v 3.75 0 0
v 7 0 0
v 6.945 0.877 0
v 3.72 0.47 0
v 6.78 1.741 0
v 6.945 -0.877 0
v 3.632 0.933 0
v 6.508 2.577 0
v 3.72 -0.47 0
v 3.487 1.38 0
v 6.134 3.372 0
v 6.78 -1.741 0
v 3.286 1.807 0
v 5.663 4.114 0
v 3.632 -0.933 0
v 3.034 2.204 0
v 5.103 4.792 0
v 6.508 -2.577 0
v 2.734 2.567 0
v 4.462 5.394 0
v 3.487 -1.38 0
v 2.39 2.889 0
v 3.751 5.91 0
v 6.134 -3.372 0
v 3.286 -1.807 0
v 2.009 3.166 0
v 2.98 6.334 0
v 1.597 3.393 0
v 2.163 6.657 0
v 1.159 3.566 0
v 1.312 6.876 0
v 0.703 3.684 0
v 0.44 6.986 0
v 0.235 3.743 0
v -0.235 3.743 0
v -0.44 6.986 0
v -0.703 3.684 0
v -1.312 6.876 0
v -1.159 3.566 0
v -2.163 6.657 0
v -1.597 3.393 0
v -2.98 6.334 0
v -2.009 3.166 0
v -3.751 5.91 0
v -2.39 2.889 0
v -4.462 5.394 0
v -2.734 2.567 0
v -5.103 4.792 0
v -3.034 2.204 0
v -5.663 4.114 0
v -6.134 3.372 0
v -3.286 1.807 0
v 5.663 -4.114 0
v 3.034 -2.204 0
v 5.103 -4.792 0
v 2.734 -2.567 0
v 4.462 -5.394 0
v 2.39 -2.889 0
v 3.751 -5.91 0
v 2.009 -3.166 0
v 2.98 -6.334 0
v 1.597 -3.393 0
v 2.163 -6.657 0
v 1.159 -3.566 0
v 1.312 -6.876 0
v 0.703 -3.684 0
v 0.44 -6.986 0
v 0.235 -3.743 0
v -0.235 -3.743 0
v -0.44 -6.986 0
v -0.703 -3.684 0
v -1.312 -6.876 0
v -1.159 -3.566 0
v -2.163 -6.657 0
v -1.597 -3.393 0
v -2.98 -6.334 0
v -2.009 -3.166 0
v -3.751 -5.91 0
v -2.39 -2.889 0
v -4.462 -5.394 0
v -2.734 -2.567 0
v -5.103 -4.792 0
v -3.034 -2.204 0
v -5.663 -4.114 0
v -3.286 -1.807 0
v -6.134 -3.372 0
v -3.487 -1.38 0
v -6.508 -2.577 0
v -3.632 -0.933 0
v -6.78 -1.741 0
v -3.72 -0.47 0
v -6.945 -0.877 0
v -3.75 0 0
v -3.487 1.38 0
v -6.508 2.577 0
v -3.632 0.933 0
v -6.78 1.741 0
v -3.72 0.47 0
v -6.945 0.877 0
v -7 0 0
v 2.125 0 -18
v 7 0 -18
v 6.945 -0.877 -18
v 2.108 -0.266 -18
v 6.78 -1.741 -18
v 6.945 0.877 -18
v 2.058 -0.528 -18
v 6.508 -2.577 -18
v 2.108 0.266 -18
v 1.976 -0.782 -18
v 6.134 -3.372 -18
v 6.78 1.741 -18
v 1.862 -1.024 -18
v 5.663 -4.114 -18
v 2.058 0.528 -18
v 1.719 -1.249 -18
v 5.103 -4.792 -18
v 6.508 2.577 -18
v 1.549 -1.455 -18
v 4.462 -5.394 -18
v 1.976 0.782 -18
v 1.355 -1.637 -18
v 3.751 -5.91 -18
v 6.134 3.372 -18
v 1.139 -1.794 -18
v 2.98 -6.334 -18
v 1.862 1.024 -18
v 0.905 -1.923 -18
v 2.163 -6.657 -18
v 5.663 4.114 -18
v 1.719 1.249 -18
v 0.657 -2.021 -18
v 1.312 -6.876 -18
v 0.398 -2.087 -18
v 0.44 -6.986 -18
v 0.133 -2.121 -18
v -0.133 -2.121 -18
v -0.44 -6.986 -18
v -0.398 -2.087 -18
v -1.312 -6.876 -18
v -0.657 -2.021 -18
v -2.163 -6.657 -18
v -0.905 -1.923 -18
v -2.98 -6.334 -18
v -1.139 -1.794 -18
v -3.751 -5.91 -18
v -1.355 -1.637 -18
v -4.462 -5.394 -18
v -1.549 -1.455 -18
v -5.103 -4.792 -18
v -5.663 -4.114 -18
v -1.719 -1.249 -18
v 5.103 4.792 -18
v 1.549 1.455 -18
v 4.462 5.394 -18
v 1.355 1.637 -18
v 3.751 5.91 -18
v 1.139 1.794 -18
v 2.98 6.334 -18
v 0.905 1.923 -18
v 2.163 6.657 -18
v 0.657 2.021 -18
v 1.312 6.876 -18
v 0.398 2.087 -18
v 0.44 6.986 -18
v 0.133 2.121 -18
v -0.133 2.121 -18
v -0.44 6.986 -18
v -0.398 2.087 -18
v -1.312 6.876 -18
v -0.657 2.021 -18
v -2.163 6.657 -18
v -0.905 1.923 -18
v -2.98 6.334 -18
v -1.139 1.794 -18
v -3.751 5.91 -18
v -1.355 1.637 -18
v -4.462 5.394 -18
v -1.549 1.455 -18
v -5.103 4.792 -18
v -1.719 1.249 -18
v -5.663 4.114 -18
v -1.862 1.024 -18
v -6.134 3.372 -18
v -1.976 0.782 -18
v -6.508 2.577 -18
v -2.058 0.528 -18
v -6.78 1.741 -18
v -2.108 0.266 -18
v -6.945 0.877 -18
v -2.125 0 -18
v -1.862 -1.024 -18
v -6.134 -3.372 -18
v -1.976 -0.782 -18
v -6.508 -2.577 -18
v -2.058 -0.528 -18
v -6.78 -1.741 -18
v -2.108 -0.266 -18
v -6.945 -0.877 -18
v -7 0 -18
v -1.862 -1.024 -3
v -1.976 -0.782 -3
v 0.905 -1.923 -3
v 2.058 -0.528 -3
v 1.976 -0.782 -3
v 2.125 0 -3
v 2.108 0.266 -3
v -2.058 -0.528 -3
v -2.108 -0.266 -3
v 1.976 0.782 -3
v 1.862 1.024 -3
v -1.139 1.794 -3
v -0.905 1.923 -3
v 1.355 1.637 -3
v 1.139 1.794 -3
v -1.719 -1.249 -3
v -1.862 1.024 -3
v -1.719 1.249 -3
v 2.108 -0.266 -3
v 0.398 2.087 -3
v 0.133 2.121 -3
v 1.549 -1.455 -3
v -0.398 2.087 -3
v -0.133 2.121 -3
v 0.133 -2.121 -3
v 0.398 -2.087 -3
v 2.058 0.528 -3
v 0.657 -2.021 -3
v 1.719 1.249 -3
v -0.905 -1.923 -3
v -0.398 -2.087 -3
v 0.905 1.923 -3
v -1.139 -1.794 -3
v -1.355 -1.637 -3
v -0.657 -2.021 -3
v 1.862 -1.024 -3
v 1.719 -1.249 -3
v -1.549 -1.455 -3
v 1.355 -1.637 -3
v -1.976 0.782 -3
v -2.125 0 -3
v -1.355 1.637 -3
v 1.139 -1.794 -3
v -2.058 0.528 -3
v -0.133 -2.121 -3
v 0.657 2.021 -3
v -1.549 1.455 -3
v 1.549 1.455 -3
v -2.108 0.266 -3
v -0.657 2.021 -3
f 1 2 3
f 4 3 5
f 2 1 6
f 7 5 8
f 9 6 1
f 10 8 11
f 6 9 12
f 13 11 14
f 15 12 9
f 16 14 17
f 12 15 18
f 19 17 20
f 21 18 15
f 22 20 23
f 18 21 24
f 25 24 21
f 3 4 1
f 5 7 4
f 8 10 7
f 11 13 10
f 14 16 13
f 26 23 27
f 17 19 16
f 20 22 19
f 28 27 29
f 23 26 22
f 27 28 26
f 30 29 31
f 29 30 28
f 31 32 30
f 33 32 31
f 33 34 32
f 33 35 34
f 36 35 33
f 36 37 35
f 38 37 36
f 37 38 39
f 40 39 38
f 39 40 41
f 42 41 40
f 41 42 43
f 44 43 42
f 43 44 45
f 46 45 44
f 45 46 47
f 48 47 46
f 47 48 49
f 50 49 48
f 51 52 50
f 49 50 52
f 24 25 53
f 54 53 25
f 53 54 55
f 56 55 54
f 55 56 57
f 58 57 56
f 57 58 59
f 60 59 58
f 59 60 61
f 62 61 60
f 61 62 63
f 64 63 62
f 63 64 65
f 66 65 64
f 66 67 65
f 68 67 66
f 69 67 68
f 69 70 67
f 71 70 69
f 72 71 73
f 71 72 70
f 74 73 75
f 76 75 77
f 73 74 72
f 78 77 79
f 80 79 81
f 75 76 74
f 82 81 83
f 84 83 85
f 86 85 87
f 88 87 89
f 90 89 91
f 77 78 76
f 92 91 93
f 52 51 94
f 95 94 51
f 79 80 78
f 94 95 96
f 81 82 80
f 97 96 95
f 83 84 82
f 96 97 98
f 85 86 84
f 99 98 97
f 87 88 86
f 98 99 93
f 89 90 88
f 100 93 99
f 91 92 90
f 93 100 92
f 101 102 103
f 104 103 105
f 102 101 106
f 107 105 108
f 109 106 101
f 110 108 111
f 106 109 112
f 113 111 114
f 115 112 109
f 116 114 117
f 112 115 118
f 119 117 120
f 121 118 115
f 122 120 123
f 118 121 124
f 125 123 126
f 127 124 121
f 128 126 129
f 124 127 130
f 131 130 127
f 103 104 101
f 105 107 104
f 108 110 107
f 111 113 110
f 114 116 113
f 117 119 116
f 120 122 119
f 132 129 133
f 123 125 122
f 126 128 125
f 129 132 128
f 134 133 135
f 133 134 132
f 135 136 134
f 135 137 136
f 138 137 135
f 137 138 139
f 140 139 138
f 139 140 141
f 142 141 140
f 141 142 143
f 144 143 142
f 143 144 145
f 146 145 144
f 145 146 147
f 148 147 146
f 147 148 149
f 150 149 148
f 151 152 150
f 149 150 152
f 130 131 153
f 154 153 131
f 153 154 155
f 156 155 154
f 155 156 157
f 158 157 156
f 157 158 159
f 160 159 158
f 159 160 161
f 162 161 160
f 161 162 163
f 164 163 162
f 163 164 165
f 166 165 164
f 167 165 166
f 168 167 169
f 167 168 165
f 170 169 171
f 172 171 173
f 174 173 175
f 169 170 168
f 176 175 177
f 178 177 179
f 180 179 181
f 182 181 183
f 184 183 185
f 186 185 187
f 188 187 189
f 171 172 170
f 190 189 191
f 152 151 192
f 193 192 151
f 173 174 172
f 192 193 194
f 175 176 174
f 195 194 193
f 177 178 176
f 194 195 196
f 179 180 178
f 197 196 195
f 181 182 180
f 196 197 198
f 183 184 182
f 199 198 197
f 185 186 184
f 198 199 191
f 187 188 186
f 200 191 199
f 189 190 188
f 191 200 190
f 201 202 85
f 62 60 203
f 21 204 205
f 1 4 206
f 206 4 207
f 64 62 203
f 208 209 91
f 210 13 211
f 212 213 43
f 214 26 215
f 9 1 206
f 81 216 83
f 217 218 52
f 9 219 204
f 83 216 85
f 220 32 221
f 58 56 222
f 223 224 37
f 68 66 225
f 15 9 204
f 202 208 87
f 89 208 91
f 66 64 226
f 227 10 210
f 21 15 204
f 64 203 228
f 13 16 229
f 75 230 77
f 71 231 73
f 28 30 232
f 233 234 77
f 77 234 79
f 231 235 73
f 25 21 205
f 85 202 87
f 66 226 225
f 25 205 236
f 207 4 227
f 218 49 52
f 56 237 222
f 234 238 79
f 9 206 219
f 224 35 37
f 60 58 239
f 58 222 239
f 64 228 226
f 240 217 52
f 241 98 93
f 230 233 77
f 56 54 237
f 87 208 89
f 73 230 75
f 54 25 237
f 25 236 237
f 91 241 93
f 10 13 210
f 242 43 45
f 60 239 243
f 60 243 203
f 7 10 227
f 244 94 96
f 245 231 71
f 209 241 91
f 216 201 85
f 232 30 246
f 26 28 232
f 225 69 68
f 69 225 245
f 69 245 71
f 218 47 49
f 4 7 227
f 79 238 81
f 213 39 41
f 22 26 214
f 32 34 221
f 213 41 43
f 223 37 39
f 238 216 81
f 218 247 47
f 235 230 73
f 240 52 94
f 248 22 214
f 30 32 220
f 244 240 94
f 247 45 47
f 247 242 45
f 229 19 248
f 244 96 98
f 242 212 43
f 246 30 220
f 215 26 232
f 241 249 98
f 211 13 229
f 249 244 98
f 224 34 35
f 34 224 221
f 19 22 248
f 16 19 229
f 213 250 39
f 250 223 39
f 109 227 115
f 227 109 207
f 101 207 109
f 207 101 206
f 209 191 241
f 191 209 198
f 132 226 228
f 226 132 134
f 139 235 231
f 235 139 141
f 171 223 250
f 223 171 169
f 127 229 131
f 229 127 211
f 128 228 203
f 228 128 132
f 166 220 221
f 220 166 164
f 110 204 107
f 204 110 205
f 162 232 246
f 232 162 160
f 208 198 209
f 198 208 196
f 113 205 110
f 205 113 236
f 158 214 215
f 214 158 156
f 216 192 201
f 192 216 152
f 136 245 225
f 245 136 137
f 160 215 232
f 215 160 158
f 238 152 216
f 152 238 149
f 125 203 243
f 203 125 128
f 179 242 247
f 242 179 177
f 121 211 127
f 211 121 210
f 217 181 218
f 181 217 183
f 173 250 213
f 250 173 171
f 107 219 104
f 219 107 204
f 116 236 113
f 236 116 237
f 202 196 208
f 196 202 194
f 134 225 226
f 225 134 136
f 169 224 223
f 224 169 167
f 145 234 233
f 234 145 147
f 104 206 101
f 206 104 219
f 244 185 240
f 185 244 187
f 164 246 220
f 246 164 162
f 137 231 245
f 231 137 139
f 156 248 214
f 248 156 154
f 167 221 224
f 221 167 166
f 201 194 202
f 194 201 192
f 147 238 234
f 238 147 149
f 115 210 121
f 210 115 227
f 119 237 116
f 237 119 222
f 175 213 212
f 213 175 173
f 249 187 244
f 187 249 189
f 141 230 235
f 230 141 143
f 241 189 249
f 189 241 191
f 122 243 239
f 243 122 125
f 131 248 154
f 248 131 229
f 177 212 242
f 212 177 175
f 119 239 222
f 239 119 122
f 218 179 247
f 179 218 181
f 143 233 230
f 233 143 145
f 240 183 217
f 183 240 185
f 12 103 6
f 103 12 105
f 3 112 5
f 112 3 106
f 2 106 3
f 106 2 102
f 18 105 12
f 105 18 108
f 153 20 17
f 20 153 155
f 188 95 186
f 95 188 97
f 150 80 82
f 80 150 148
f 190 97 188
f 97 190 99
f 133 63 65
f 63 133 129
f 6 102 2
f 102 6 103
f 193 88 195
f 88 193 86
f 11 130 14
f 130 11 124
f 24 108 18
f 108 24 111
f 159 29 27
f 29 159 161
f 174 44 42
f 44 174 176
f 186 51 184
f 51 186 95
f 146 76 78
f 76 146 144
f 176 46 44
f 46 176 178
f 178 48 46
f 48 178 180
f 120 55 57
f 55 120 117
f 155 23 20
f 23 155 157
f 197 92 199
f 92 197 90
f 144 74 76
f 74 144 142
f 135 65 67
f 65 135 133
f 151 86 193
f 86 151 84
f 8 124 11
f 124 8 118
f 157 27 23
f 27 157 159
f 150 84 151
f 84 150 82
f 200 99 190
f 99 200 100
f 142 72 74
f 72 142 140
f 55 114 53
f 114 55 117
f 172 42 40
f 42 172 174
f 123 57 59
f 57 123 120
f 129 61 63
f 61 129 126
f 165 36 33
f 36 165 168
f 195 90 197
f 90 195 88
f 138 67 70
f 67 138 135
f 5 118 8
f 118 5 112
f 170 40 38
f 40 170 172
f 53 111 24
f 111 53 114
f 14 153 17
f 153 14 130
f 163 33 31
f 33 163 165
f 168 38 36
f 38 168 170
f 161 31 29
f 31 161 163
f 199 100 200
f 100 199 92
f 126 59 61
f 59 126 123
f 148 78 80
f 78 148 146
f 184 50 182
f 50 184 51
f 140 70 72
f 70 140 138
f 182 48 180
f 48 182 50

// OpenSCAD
$fn = 50;


difference() {
	union() {
		translate(v = [0, 0, -18.0000000000]) {
			cylinder(h = 18, r = 7.0000000000);
		}
		cylinder(h = 0, r = 13.0000000000);
	}
	union() {
		translate(v = [0, 0, 0]) {
			rotate(a = [0, 0, 0]) {
				difference() {
					union() {
						#translate(v = [0, 0, -18.0000000000]) {
							cylinder(h = 18, r = 2.0000000000);
						}
						#translate(v = [0, 0, -3]) {
							cylinder(h = 3, r1 = 2.1250000000, r2 = 3.7500000000);
						}
						#translate(v = [0, 0, -18.0000000000]) {
							cylinder(h = 18, r = 2.1250000000);
						}
						#translate(v = [0, 0, -18.0000000000]) {
							cylinder(h = 18, r = 2.0000000000);
						}
					}
					union();
				}
			}
		}
	}
}
